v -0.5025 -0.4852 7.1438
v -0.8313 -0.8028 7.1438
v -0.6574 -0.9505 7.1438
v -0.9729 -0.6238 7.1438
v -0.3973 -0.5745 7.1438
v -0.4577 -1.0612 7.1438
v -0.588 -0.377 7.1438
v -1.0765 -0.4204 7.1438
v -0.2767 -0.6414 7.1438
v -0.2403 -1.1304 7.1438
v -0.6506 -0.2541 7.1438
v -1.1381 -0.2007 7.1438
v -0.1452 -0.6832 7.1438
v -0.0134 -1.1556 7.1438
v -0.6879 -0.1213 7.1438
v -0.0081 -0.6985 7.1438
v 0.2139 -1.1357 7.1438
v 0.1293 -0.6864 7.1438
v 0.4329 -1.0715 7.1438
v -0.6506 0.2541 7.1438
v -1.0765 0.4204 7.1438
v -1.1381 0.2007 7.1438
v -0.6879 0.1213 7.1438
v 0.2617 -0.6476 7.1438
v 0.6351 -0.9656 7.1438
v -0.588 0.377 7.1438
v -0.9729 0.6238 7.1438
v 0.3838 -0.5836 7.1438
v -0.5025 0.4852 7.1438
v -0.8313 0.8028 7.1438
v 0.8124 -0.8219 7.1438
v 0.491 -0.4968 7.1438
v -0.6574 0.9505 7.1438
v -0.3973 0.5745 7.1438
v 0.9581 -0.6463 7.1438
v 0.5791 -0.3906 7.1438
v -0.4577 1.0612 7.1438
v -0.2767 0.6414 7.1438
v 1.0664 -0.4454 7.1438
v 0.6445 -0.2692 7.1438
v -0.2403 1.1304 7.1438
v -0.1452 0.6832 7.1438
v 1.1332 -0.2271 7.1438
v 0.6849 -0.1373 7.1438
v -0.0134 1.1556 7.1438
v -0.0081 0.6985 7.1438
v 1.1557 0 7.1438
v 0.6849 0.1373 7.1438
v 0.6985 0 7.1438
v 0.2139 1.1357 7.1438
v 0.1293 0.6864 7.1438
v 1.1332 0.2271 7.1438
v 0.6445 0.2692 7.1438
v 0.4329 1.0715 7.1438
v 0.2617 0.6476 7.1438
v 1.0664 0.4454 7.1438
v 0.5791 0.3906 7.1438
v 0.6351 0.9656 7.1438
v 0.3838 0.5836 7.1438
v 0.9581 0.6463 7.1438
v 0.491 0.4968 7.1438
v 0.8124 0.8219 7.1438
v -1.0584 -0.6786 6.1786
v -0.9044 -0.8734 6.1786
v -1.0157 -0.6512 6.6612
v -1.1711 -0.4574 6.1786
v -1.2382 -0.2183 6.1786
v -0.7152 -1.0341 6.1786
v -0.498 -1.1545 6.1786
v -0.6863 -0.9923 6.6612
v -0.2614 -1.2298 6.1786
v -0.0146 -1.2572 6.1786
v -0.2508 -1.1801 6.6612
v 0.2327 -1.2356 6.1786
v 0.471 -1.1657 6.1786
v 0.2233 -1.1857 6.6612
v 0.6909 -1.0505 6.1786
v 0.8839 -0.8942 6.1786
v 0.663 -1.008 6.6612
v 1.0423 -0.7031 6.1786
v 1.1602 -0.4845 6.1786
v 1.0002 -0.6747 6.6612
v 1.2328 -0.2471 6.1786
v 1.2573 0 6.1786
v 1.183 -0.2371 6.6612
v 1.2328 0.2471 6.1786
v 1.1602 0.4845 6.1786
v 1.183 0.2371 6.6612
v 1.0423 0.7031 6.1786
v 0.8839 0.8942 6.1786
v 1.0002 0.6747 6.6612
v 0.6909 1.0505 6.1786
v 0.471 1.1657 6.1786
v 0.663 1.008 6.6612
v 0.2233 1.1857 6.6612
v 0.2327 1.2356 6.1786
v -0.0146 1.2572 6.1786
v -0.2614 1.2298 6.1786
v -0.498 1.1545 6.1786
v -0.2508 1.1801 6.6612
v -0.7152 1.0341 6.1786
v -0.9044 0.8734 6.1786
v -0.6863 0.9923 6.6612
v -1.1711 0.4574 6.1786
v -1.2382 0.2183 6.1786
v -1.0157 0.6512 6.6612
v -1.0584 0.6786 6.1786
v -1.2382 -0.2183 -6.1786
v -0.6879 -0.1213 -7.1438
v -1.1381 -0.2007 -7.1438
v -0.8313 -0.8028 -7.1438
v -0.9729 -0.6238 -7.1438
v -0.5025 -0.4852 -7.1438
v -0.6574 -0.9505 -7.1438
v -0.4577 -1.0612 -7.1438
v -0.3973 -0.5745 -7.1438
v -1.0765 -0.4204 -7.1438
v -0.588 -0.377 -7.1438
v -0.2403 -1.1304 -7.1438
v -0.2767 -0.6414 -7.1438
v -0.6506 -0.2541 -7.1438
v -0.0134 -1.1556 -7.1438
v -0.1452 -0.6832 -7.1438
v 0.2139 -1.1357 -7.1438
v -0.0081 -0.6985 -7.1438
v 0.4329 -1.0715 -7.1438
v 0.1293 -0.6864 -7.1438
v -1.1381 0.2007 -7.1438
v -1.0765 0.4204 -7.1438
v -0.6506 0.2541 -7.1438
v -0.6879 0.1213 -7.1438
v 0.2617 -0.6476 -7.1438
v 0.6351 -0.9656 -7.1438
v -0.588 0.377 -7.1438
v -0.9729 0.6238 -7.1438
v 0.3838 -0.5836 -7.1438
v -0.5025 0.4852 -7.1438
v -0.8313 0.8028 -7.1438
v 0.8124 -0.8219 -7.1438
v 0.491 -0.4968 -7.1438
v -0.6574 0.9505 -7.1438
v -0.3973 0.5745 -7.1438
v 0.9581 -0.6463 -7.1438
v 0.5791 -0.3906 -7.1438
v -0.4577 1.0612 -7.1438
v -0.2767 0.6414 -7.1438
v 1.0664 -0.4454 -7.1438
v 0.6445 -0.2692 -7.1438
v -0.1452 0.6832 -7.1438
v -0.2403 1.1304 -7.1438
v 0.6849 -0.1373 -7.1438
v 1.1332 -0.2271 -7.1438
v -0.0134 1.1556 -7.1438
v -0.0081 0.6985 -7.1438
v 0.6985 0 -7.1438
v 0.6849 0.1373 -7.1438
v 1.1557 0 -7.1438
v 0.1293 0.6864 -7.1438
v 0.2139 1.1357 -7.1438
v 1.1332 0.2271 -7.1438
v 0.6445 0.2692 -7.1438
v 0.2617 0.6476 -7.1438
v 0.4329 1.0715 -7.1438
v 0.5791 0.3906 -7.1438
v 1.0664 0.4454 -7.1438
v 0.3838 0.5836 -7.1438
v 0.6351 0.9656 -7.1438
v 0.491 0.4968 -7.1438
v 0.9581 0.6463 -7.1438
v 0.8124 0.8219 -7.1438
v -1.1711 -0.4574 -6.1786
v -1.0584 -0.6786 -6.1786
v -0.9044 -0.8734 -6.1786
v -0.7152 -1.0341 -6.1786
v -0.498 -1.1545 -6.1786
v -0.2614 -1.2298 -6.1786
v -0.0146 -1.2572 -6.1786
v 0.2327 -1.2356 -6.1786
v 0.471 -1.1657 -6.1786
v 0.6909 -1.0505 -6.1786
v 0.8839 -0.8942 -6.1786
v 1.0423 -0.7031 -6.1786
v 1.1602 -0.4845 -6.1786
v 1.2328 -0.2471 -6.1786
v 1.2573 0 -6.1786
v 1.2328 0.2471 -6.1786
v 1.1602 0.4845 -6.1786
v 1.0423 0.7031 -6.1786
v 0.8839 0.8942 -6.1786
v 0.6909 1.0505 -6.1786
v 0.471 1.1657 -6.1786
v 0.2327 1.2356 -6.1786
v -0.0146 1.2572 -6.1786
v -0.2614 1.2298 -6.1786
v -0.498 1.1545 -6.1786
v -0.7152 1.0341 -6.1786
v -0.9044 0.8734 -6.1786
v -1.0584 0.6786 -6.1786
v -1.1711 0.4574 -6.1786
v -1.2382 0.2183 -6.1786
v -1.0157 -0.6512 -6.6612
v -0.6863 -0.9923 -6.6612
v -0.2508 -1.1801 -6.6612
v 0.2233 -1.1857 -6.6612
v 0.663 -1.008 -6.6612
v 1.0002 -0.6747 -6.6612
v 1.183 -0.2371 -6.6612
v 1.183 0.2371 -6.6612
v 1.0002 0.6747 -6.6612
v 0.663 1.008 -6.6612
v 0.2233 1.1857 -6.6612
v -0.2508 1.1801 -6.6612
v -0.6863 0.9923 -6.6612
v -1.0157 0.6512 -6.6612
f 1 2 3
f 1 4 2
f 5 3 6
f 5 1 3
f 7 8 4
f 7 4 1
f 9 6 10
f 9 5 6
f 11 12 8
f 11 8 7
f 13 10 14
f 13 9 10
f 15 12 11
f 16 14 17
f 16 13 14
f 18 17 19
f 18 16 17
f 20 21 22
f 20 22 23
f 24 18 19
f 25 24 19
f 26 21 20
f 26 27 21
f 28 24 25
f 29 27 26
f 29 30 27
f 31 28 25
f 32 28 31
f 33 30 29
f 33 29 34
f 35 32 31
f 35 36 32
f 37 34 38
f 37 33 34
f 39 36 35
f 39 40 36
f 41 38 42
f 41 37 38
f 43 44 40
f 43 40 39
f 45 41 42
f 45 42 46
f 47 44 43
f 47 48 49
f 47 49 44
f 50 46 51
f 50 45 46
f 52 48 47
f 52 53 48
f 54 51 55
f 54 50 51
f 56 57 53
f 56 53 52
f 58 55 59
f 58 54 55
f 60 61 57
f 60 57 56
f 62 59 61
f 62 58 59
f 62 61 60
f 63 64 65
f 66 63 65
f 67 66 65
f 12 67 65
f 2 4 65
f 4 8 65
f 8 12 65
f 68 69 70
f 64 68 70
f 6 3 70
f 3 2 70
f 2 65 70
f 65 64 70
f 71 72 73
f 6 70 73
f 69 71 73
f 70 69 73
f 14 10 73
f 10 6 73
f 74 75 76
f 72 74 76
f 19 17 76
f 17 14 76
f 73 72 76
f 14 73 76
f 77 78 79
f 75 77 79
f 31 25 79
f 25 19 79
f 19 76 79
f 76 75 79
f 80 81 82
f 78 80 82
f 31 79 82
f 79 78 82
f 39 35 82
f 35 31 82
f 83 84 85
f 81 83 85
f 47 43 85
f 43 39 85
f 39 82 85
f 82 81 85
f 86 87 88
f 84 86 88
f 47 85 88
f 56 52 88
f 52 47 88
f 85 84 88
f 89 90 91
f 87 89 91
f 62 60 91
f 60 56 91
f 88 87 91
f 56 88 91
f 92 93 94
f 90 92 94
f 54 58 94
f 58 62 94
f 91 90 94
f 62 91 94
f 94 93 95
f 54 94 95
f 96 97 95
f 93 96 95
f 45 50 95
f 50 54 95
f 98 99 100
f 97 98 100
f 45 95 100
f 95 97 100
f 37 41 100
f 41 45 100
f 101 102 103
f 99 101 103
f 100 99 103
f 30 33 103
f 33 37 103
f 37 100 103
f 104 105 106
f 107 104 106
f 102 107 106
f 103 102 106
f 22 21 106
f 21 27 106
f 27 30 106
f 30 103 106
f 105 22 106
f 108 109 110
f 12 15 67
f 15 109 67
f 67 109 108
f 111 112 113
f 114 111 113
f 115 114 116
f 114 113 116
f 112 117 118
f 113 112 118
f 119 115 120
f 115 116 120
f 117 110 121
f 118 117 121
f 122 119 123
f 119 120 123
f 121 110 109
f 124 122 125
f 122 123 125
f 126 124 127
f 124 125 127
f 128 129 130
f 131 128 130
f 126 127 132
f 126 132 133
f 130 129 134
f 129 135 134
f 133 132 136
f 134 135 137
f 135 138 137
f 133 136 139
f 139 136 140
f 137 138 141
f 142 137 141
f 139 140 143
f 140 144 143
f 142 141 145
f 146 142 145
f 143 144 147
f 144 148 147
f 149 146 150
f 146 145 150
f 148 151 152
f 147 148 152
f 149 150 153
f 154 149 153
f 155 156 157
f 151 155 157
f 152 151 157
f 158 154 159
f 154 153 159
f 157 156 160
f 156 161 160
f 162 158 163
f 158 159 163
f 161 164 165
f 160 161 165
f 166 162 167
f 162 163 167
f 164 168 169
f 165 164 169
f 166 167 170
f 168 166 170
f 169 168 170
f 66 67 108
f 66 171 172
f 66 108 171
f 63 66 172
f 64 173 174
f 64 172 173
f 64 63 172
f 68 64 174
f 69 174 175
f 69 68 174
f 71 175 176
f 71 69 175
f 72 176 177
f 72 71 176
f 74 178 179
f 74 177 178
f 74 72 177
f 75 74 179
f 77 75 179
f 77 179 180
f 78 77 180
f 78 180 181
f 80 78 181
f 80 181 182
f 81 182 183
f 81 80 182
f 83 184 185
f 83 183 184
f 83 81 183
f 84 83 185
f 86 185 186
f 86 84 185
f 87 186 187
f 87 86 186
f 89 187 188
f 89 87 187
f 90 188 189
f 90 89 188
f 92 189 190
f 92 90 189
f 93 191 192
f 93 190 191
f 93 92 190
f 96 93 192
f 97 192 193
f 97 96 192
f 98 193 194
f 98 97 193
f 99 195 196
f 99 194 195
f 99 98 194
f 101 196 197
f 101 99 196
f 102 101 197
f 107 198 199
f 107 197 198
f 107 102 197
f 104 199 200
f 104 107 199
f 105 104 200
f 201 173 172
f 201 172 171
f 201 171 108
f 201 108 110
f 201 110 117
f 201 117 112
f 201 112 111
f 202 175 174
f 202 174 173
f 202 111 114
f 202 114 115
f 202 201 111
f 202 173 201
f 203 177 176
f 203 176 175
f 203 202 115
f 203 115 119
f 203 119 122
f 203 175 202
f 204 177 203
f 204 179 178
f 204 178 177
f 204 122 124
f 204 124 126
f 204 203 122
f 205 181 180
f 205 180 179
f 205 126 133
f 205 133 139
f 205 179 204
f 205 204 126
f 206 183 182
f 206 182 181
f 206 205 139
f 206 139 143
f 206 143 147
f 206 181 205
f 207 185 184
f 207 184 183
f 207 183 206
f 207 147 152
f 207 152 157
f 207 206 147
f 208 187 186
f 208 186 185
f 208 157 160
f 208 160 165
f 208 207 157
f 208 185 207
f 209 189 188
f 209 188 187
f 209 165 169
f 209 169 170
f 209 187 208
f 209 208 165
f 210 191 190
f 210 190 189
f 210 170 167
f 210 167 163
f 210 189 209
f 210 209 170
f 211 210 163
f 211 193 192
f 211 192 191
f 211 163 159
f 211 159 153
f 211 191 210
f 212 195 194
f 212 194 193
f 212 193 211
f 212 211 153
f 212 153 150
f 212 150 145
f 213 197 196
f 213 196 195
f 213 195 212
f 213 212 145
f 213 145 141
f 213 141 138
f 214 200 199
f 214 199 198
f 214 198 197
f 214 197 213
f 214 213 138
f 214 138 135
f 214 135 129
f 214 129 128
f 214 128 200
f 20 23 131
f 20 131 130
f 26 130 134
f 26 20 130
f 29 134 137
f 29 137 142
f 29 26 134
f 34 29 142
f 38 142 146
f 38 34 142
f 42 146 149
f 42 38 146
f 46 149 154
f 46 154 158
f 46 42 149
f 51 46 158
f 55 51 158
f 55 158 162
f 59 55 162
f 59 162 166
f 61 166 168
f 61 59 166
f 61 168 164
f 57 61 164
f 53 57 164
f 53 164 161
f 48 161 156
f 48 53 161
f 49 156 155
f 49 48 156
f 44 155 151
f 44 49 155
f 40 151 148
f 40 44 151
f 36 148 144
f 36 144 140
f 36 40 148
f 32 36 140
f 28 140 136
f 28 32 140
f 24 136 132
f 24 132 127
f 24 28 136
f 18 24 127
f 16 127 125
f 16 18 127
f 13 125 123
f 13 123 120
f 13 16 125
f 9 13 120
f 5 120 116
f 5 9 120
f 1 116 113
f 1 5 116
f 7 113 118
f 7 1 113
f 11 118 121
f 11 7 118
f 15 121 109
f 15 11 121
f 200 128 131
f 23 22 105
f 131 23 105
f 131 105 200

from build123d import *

# Parameters (mm, degrees)
EXTRUDE1_DEPTH = 7.14375


with BuildPart() as part:
    # Sketch1 → Extrude1 (new body, symmetric)
    with BuildSketch(Plane.XY):
        with BuildLine():
            Line((-1.238198788, 0.218327854), (-0.687888215, 0.121293252))
            ThreePointArc((-0.687888215, 0.121293252), (0.6985, 0), (-0.687888215, -0.121293252))
            Line((-0.687888215, -0.121293252), (-1.238198788, -0.218327854))
            ThreePointArc((-1.238198788, -0.218327854), (1.2573, 0), (-1.238198788, 0.218327854))
        make_face()
    extrude(amount=EXTRUDE1_DEPTH, both=True)

    # Sketch2 → Cut-Revolve1 (revolve, cut)
    with BuildSketch(Plane(origin=(0, 0, 0), x_dir=(0, 0, -1), z_dir=(1, 0, 0))):
        Polygon((7.14375, 1.2573), (7.14375, 1.1557), (6.17855, 1.2573), align=None)
        Polygon((-6.17855, 1.2573), (-7.14375, 1.2573), (-7.14375, 1.1557), align=None)
    revolve(axis=Axis((0, 0, -7.14375), (0, 0, 1)), mode=Mode.SUBTRACT)


solid = part.part
